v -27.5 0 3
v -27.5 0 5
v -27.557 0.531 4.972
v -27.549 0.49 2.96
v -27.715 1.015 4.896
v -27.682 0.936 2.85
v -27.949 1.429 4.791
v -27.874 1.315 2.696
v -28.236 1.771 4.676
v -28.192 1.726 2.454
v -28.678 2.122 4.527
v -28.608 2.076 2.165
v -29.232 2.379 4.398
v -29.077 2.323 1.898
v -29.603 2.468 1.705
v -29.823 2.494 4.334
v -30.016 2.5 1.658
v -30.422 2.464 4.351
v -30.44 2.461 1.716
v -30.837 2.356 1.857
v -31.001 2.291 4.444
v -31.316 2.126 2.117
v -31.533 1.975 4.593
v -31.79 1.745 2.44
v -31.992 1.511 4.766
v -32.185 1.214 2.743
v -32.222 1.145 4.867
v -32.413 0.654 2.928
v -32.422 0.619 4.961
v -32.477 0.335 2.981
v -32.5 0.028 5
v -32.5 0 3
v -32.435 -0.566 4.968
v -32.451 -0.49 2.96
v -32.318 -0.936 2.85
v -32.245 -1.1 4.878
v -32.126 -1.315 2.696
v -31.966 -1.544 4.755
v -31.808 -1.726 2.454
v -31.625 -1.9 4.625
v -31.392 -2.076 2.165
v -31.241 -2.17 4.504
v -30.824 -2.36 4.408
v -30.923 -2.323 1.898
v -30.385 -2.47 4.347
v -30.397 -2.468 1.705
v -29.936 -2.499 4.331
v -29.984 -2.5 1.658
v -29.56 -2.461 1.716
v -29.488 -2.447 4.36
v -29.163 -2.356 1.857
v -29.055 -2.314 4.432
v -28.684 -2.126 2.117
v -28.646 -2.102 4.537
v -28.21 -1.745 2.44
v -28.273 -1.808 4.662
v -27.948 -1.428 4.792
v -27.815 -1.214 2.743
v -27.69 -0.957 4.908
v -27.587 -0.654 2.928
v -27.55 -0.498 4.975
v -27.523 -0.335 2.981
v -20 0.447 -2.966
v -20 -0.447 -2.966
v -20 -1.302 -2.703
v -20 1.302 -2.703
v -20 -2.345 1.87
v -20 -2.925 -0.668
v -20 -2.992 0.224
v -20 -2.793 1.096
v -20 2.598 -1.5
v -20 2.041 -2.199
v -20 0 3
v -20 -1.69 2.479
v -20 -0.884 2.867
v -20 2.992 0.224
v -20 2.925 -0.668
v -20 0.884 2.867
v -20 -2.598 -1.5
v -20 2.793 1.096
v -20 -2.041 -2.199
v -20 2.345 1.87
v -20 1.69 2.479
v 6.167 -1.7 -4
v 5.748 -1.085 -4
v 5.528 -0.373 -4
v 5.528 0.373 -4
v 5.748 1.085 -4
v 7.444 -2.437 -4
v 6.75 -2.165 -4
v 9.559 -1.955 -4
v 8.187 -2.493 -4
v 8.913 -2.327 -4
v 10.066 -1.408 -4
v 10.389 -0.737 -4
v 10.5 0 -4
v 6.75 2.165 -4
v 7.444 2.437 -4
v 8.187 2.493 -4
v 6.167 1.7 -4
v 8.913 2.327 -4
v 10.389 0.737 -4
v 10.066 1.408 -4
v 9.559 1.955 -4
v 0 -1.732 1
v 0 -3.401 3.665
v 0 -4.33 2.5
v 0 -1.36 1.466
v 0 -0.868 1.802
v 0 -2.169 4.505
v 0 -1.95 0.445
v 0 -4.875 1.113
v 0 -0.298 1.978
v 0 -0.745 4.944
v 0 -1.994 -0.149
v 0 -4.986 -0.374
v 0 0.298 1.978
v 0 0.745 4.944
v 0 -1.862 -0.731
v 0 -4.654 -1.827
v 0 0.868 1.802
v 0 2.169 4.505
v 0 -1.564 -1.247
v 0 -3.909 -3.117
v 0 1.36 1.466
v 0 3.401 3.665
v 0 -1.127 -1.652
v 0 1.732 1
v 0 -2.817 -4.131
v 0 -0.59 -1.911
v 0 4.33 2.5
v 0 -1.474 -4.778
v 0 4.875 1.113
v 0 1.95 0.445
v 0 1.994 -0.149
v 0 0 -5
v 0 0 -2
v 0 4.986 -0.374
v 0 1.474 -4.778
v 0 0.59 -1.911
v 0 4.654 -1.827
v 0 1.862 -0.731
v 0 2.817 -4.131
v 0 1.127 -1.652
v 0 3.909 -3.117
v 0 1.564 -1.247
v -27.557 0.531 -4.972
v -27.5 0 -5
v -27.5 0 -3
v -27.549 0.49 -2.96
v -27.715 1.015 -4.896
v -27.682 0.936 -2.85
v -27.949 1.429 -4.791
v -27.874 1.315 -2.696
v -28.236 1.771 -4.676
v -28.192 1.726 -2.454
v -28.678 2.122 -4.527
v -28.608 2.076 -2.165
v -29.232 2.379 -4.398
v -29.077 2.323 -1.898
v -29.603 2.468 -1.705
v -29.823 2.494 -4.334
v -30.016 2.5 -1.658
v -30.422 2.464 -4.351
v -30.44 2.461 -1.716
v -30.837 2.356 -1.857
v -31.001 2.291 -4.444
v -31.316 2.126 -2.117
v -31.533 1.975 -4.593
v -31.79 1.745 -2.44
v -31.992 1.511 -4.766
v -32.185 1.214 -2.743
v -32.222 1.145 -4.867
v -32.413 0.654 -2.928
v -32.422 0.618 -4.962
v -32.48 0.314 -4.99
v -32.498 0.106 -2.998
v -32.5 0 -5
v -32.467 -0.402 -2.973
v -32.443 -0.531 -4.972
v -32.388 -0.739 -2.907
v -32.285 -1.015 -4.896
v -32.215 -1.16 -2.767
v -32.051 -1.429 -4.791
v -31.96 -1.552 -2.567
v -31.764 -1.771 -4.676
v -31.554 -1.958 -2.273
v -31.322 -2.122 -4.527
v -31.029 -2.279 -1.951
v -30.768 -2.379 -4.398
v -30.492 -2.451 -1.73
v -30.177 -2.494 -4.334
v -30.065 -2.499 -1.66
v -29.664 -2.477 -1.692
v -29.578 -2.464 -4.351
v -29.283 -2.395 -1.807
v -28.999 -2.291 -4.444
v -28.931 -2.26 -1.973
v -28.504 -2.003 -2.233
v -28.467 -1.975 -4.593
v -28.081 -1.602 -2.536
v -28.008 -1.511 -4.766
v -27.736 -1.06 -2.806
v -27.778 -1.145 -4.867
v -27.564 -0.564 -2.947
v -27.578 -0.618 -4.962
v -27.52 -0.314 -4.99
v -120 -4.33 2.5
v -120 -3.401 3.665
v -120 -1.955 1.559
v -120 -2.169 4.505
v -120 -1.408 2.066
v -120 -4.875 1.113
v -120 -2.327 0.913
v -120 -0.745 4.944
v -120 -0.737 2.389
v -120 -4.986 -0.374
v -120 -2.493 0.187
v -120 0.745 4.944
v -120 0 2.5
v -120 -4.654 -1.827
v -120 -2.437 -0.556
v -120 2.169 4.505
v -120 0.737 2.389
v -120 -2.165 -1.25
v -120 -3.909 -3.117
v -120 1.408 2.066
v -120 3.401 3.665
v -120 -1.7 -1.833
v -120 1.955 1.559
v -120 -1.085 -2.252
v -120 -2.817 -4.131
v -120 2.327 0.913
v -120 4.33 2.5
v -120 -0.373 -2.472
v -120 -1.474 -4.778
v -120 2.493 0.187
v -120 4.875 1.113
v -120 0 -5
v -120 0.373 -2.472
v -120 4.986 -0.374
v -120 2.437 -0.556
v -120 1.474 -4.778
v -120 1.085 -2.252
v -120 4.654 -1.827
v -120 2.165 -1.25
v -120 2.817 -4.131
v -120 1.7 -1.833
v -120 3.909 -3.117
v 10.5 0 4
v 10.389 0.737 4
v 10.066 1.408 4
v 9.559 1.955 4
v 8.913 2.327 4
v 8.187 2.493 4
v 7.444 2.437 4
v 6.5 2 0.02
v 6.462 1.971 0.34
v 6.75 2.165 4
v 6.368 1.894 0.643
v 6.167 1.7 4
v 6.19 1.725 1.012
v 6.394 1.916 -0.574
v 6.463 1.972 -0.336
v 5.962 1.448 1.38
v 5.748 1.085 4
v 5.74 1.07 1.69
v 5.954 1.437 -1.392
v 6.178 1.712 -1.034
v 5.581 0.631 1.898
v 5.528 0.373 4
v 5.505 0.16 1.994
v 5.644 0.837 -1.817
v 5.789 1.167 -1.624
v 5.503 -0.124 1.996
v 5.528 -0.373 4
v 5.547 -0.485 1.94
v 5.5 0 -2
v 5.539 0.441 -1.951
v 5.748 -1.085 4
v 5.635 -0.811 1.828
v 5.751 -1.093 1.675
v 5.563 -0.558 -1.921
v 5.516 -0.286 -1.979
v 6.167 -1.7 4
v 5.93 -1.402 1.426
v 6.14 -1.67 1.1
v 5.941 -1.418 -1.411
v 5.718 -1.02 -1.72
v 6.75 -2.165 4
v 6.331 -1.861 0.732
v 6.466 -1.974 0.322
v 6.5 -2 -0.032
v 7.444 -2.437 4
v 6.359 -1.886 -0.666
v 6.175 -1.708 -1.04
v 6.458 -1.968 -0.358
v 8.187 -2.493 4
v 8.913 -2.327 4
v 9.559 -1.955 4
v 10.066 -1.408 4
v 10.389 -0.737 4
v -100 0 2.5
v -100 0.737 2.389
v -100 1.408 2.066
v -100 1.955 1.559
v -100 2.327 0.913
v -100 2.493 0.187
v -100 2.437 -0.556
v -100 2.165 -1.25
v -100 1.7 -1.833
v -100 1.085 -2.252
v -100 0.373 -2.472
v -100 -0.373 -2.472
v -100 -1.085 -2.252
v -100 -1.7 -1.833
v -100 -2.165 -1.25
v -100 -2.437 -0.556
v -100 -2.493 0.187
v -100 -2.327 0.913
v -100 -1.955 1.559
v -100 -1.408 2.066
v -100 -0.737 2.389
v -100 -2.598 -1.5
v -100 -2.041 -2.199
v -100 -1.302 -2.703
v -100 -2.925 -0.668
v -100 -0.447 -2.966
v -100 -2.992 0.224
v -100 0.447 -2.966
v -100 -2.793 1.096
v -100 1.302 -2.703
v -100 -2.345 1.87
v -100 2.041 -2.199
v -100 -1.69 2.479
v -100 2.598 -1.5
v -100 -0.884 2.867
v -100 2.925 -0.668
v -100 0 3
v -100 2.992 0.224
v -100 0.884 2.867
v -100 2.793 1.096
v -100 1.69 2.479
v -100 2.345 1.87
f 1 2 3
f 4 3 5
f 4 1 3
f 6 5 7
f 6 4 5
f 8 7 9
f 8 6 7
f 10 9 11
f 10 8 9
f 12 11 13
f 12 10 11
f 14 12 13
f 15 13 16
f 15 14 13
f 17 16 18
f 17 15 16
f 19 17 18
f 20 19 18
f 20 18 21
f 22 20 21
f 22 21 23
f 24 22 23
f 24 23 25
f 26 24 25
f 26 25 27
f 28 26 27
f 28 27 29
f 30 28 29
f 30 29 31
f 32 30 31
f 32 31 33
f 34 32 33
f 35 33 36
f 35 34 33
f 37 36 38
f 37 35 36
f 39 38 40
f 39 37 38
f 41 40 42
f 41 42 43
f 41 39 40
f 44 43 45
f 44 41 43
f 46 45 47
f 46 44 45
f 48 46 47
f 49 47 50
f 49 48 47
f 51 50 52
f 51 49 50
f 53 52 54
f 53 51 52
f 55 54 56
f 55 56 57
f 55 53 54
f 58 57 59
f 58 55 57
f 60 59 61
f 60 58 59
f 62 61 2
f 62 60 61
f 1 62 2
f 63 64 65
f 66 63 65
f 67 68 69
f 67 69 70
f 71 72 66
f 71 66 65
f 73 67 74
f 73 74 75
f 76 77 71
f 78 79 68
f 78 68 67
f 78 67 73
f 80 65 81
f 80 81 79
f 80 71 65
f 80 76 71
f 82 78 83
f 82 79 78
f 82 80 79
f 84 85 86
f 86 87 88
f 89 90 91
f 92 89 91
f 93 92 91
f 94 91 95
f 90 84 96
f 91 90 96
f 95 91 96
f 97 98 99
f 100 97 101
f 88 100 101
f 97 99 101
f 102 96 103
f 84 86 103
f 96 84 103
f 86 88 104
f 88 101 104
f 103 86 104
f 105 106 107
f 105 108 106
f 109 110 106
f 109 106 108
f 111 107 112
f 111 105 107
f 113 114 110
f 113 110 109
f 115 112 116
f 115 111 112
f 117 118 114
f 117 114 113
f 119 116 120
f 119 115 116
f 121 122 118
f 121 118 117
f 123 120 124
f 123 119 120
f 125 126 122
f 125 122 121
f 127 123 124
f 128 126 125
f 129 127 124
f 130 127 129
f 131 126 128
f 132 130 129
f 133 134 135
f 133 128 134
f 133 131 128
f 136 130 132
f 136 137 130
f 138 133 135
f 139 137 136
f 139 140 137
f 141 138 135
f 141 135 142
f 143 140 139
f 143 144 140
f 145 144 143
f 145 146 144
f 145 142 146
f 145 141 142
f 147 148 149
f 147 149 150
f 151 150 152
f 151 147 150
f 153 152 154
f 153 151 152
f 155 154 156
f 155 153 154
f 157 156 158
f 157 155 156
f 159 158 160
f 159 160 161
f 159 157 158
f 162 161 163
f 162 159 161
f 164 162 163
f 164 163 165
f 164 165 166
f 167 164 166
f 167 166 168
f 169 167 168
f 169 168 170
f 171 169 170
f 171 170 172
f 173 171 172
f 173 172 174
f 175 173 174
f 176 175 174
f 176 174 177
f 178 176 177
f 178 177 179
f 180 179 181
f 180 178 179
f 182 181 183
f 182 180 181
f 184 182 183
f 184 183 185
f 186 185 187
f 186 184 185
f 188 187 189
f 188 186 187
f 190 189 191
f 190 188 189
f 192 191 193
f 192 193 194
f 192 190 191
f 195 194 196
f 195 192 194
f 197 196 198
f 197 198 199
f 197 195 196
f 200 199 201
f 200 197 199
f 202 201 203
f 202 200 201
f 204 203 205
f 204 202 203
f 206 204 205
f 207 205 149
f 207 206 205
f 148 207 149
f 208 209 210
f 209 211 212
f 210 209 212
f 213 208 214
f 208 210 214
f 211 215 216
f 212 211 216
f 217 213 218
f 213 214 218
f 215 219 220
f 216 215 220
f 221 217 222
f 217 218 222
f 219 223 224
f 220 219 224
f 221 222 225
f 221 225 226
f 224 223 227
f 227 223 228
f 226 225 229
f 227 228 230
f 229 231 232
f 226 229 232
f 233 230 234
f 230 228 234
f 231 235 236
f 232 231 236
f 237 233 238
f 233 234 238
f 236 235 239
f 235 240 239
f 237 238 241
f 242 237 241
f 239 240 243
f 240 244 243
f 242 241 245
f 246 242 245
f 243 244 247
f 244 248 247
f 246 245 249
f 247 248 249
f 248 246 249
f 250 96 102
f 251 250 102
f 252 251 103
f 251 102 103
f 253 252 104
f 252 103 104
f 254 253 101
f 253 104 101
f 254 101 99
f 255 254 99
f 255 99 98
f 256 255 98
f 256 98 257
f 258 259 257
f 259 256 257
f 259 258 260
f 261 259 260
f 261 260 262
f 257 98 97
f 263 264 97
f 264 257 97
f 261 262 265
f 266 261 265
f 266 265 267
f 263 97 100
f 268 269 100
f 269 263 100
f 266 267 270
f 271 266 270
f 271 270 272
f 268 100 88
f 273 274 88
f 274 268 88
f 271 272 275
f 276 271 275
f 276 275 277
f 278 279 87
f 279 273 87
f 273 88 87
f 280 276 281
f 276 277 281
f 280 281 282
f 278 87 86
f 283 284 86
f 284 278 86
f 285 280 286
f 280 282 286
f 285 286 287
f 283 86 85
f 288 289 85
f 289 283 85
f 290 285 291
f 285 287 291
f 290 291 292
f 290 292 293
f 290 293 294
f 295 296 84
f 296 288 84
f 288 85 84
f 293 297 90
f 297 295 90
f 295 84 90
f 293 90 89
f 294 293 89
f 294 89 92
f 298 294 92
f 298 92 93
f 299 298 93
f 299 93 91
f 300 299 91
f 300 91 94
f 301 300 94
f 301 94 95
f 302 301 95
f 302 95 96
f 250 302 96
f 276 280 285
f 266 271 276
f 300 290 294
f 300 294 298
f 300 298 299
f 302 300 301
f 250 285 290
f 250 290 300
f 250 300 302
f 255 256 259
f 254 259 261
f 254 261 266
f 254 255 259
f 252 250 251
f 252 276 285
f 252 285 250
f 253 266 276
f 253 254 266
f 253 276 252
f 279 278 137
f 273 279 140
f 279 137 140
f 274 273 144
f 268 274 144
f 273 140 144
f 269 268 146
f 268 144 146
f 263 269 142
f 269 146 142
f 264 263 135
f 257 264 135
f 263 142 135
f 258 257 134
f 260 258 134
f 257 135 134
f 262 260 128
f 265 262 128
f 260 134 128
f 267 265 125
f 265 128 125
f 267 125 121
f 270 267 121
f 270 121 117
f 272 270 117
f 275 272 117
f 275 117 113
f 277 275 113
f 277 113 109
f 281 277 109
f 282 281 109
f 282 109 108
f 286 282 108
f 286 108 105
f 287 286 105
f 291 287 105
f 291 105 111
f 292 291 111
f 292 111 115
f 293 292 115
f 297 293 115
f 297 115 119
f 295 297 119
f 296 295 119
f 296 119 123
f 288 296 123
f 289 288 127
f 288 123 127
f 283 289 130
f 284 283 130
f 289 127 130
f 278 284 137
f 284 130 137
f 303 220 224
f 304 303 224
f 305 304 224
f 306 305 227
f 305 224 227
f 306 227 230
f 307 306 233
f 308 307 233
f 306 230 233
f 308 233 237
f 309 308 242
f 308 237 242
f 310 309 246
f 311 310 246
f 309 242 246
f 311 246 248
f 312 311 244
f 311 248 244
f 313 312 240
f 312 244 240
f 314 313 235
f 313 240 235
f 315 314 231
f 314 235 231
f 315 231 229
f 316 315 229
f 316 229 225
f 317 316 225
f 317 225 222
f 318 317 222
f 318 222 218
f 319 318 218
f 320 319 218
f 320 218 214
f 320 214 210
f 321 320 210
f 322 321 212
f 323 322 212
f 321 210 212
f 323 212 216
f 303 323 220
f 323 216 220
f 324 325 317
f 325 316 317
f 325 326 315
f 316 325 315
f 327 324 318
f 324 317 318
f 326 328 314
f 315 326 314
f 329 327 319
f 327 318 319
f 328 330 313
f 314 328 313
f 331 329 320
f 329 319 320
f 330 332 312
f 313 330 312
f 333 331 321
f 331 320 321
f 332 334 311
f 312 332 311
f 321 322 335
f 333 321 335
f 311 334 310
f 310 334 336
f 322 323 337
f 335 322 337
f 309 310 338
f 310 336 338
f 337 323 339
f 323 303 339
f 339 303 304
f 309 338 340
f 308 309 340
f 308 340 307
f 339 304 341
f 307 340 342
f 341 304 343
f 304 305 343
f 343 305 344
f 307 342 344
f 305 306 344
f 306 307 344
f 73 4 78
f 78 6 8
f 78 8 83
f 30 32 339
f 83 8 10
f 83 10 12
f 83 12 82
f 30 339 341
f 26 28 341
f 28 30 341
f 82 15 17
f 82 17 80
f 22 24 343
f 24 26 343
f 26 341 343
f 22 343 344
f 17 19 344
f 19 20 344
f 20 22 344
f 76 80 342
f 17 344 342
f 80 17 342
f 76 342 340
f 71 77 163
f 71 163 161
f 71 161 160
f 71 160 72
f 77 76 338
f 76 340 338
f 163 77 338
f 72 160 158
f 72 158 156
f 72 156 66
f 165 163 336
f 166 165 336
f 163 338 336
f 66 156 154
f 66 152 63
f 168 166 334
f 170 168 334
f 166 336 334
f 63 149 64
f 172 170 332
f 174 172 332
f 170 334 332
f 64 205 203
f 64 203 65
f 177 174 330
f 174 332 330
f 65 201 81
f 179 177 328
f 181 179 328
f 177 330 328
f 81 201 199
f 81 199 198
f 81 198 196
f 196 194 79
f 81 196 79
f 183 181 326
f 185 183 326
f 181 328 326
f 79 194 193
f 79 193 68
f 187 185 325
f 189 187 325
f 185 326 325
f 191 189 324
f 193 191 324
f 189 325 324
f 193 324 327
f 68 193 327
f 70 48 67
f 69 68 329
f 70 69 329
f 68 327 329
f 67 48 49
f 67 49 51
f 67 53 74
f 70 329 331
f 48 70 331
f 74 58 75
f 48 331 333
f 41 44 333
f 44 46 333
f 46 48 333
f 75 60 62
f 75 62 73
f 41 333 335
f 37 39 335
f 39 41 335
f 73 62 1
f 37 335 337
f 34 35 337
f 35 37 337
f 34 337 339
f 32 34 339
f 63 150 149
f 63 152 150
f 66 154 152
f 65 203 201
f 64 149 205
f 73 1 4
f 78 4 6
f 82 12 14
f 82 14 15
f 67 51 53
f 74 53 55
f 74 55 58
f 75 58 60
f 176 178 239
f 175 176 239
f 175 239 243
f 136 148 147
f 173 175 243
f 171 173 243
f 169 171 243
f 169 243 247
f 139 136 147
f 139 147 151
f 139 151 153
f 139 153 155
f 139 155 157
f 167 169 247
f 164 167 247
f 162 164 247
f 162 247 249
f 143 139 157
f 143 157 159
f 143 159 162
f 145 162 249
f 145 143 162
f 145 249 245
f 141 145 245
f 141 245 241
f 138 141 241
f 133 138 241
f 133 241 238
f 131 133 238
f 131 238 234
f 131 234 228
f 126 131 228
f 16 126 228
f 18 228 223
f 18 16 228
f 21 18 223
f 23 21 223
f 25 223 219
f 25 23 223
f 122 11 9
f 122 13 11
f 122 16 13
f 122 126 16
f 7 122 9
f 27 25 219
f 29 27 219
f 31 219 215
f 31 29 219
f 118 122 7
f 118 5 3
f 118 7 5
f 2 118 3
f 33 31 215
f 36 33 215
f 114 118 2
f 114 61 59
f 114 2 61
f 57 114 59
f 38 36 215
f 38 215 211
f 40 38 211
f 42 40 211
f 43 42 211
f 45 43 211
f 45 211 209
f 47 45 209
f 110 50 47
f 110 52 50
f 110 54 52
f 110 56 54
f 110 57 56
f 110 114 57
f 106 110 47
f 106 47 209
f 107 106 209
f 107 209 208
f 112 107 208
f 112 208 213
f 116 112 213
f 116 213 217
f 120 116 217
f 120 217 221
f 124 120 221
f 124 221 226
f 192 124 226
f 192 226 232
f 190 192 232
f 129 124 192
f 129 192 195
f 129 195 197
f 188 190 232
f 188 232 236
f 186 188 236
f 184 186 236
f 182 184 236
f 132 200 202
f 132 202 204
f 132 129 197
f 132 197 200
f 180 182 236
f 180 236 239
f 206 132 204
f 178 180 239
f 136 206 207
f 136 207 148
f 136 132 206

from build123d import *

# Parameters (mm, degrees)
SKETCH1_R                = 5
BOSS_EXTRUDE1_DEPTH      = 120
SKETCH2_R                = 2.5
CUT_EXTRUDE1_DEPTH       = 20
SKETCH3_R                = 3
CUT_EXTRUDE2_DEPTH       = 80
SKETCH4_R                = 2
BOSS_EXTRUDE2_DEPTH      = 8
BOSS_EXTRUDE3_DEPTH      = 4
BOSS_EXTRUDE3_DEPTH_BACK = 4
SKETCH5_R                = 2.5
CUT_EXTRUDE3_DEPTH       = 121.208152802
CUT_EXTRUDE3_DEPTH_BACK  = 121.208152802
SKETCH6_R                = 2.5


with BuildPart() as part:
    # Sketch1 → Boss-Extrude1 (new body)
    with BuildSketch(Plane(origin=(0, 0, 0), x_dir=(0, 0, -1), z_dir=(1, 0, 0))):
        Circle(SKETCH1_R)
    extrude(amount=-BOSS_EXTRUDE1_DEPTH)

    # Sketch2 → Cut-Extrude1 (cut)
    with BuildSketch(Plane.ZY.offset(120)):
        Circle(SKETCH2_R)
    extrude(amount=-CUT_EXTRUDE1_DEPTH, mode=Mode.SUBTRACT)

    # Sketch3 → Cut-Extrude2 (cut)
    with BuildSketch(Plane.ZY.offset(100)):
        Circle(SKETCH3_R)
    extrude(amount=-CUT_EXTRUDE2_DEPTH, mode=Mode.SUBTRACT)

    # Sketch4 → Boss-Extrude2 (add)
    with BuildSketch(Plane(origin=(0, 0, 0), x_dir=(0, 0, -1), z_dir=(1, 0, 0))):
        Circle(SKETCH4_R)
    extrude(amount=BOSS_EXTRUDE2_DEPTH)

    # Sketch5 → Boss-Extrude3 (add, two sides: drawn at the far end of the back side and taken through both)
    with BuildSketch(Plane.XY.offset(-BOSS_EXTRUDE3_DEPTH_BACK)):
        with Locations((8, 0)):
            Circle(SKETCH5_R)
    extrude(amount=BOSS_EXTRUDE3_DEPTH + BOSS_EXTRUDE3_DEPTH_BACK)

    # Sketch6 → Cut-Extrude3 (cut, two sides: drawn at the far end of the back side and taken through both)
    with BuildSketch(Plane.XY.offset(-CUT_EXTRUDE3_DEPTH_BACK)):
        with Locations((-30, 0)):
            Circle(SKETCH6_R)
    extrude(amount=CUT_EXTRUDE3_DEPTH + CUT_EXTRUDE3_DEPTH_BACK, mode=Mode.SUBTRACT)


solid = part.part
